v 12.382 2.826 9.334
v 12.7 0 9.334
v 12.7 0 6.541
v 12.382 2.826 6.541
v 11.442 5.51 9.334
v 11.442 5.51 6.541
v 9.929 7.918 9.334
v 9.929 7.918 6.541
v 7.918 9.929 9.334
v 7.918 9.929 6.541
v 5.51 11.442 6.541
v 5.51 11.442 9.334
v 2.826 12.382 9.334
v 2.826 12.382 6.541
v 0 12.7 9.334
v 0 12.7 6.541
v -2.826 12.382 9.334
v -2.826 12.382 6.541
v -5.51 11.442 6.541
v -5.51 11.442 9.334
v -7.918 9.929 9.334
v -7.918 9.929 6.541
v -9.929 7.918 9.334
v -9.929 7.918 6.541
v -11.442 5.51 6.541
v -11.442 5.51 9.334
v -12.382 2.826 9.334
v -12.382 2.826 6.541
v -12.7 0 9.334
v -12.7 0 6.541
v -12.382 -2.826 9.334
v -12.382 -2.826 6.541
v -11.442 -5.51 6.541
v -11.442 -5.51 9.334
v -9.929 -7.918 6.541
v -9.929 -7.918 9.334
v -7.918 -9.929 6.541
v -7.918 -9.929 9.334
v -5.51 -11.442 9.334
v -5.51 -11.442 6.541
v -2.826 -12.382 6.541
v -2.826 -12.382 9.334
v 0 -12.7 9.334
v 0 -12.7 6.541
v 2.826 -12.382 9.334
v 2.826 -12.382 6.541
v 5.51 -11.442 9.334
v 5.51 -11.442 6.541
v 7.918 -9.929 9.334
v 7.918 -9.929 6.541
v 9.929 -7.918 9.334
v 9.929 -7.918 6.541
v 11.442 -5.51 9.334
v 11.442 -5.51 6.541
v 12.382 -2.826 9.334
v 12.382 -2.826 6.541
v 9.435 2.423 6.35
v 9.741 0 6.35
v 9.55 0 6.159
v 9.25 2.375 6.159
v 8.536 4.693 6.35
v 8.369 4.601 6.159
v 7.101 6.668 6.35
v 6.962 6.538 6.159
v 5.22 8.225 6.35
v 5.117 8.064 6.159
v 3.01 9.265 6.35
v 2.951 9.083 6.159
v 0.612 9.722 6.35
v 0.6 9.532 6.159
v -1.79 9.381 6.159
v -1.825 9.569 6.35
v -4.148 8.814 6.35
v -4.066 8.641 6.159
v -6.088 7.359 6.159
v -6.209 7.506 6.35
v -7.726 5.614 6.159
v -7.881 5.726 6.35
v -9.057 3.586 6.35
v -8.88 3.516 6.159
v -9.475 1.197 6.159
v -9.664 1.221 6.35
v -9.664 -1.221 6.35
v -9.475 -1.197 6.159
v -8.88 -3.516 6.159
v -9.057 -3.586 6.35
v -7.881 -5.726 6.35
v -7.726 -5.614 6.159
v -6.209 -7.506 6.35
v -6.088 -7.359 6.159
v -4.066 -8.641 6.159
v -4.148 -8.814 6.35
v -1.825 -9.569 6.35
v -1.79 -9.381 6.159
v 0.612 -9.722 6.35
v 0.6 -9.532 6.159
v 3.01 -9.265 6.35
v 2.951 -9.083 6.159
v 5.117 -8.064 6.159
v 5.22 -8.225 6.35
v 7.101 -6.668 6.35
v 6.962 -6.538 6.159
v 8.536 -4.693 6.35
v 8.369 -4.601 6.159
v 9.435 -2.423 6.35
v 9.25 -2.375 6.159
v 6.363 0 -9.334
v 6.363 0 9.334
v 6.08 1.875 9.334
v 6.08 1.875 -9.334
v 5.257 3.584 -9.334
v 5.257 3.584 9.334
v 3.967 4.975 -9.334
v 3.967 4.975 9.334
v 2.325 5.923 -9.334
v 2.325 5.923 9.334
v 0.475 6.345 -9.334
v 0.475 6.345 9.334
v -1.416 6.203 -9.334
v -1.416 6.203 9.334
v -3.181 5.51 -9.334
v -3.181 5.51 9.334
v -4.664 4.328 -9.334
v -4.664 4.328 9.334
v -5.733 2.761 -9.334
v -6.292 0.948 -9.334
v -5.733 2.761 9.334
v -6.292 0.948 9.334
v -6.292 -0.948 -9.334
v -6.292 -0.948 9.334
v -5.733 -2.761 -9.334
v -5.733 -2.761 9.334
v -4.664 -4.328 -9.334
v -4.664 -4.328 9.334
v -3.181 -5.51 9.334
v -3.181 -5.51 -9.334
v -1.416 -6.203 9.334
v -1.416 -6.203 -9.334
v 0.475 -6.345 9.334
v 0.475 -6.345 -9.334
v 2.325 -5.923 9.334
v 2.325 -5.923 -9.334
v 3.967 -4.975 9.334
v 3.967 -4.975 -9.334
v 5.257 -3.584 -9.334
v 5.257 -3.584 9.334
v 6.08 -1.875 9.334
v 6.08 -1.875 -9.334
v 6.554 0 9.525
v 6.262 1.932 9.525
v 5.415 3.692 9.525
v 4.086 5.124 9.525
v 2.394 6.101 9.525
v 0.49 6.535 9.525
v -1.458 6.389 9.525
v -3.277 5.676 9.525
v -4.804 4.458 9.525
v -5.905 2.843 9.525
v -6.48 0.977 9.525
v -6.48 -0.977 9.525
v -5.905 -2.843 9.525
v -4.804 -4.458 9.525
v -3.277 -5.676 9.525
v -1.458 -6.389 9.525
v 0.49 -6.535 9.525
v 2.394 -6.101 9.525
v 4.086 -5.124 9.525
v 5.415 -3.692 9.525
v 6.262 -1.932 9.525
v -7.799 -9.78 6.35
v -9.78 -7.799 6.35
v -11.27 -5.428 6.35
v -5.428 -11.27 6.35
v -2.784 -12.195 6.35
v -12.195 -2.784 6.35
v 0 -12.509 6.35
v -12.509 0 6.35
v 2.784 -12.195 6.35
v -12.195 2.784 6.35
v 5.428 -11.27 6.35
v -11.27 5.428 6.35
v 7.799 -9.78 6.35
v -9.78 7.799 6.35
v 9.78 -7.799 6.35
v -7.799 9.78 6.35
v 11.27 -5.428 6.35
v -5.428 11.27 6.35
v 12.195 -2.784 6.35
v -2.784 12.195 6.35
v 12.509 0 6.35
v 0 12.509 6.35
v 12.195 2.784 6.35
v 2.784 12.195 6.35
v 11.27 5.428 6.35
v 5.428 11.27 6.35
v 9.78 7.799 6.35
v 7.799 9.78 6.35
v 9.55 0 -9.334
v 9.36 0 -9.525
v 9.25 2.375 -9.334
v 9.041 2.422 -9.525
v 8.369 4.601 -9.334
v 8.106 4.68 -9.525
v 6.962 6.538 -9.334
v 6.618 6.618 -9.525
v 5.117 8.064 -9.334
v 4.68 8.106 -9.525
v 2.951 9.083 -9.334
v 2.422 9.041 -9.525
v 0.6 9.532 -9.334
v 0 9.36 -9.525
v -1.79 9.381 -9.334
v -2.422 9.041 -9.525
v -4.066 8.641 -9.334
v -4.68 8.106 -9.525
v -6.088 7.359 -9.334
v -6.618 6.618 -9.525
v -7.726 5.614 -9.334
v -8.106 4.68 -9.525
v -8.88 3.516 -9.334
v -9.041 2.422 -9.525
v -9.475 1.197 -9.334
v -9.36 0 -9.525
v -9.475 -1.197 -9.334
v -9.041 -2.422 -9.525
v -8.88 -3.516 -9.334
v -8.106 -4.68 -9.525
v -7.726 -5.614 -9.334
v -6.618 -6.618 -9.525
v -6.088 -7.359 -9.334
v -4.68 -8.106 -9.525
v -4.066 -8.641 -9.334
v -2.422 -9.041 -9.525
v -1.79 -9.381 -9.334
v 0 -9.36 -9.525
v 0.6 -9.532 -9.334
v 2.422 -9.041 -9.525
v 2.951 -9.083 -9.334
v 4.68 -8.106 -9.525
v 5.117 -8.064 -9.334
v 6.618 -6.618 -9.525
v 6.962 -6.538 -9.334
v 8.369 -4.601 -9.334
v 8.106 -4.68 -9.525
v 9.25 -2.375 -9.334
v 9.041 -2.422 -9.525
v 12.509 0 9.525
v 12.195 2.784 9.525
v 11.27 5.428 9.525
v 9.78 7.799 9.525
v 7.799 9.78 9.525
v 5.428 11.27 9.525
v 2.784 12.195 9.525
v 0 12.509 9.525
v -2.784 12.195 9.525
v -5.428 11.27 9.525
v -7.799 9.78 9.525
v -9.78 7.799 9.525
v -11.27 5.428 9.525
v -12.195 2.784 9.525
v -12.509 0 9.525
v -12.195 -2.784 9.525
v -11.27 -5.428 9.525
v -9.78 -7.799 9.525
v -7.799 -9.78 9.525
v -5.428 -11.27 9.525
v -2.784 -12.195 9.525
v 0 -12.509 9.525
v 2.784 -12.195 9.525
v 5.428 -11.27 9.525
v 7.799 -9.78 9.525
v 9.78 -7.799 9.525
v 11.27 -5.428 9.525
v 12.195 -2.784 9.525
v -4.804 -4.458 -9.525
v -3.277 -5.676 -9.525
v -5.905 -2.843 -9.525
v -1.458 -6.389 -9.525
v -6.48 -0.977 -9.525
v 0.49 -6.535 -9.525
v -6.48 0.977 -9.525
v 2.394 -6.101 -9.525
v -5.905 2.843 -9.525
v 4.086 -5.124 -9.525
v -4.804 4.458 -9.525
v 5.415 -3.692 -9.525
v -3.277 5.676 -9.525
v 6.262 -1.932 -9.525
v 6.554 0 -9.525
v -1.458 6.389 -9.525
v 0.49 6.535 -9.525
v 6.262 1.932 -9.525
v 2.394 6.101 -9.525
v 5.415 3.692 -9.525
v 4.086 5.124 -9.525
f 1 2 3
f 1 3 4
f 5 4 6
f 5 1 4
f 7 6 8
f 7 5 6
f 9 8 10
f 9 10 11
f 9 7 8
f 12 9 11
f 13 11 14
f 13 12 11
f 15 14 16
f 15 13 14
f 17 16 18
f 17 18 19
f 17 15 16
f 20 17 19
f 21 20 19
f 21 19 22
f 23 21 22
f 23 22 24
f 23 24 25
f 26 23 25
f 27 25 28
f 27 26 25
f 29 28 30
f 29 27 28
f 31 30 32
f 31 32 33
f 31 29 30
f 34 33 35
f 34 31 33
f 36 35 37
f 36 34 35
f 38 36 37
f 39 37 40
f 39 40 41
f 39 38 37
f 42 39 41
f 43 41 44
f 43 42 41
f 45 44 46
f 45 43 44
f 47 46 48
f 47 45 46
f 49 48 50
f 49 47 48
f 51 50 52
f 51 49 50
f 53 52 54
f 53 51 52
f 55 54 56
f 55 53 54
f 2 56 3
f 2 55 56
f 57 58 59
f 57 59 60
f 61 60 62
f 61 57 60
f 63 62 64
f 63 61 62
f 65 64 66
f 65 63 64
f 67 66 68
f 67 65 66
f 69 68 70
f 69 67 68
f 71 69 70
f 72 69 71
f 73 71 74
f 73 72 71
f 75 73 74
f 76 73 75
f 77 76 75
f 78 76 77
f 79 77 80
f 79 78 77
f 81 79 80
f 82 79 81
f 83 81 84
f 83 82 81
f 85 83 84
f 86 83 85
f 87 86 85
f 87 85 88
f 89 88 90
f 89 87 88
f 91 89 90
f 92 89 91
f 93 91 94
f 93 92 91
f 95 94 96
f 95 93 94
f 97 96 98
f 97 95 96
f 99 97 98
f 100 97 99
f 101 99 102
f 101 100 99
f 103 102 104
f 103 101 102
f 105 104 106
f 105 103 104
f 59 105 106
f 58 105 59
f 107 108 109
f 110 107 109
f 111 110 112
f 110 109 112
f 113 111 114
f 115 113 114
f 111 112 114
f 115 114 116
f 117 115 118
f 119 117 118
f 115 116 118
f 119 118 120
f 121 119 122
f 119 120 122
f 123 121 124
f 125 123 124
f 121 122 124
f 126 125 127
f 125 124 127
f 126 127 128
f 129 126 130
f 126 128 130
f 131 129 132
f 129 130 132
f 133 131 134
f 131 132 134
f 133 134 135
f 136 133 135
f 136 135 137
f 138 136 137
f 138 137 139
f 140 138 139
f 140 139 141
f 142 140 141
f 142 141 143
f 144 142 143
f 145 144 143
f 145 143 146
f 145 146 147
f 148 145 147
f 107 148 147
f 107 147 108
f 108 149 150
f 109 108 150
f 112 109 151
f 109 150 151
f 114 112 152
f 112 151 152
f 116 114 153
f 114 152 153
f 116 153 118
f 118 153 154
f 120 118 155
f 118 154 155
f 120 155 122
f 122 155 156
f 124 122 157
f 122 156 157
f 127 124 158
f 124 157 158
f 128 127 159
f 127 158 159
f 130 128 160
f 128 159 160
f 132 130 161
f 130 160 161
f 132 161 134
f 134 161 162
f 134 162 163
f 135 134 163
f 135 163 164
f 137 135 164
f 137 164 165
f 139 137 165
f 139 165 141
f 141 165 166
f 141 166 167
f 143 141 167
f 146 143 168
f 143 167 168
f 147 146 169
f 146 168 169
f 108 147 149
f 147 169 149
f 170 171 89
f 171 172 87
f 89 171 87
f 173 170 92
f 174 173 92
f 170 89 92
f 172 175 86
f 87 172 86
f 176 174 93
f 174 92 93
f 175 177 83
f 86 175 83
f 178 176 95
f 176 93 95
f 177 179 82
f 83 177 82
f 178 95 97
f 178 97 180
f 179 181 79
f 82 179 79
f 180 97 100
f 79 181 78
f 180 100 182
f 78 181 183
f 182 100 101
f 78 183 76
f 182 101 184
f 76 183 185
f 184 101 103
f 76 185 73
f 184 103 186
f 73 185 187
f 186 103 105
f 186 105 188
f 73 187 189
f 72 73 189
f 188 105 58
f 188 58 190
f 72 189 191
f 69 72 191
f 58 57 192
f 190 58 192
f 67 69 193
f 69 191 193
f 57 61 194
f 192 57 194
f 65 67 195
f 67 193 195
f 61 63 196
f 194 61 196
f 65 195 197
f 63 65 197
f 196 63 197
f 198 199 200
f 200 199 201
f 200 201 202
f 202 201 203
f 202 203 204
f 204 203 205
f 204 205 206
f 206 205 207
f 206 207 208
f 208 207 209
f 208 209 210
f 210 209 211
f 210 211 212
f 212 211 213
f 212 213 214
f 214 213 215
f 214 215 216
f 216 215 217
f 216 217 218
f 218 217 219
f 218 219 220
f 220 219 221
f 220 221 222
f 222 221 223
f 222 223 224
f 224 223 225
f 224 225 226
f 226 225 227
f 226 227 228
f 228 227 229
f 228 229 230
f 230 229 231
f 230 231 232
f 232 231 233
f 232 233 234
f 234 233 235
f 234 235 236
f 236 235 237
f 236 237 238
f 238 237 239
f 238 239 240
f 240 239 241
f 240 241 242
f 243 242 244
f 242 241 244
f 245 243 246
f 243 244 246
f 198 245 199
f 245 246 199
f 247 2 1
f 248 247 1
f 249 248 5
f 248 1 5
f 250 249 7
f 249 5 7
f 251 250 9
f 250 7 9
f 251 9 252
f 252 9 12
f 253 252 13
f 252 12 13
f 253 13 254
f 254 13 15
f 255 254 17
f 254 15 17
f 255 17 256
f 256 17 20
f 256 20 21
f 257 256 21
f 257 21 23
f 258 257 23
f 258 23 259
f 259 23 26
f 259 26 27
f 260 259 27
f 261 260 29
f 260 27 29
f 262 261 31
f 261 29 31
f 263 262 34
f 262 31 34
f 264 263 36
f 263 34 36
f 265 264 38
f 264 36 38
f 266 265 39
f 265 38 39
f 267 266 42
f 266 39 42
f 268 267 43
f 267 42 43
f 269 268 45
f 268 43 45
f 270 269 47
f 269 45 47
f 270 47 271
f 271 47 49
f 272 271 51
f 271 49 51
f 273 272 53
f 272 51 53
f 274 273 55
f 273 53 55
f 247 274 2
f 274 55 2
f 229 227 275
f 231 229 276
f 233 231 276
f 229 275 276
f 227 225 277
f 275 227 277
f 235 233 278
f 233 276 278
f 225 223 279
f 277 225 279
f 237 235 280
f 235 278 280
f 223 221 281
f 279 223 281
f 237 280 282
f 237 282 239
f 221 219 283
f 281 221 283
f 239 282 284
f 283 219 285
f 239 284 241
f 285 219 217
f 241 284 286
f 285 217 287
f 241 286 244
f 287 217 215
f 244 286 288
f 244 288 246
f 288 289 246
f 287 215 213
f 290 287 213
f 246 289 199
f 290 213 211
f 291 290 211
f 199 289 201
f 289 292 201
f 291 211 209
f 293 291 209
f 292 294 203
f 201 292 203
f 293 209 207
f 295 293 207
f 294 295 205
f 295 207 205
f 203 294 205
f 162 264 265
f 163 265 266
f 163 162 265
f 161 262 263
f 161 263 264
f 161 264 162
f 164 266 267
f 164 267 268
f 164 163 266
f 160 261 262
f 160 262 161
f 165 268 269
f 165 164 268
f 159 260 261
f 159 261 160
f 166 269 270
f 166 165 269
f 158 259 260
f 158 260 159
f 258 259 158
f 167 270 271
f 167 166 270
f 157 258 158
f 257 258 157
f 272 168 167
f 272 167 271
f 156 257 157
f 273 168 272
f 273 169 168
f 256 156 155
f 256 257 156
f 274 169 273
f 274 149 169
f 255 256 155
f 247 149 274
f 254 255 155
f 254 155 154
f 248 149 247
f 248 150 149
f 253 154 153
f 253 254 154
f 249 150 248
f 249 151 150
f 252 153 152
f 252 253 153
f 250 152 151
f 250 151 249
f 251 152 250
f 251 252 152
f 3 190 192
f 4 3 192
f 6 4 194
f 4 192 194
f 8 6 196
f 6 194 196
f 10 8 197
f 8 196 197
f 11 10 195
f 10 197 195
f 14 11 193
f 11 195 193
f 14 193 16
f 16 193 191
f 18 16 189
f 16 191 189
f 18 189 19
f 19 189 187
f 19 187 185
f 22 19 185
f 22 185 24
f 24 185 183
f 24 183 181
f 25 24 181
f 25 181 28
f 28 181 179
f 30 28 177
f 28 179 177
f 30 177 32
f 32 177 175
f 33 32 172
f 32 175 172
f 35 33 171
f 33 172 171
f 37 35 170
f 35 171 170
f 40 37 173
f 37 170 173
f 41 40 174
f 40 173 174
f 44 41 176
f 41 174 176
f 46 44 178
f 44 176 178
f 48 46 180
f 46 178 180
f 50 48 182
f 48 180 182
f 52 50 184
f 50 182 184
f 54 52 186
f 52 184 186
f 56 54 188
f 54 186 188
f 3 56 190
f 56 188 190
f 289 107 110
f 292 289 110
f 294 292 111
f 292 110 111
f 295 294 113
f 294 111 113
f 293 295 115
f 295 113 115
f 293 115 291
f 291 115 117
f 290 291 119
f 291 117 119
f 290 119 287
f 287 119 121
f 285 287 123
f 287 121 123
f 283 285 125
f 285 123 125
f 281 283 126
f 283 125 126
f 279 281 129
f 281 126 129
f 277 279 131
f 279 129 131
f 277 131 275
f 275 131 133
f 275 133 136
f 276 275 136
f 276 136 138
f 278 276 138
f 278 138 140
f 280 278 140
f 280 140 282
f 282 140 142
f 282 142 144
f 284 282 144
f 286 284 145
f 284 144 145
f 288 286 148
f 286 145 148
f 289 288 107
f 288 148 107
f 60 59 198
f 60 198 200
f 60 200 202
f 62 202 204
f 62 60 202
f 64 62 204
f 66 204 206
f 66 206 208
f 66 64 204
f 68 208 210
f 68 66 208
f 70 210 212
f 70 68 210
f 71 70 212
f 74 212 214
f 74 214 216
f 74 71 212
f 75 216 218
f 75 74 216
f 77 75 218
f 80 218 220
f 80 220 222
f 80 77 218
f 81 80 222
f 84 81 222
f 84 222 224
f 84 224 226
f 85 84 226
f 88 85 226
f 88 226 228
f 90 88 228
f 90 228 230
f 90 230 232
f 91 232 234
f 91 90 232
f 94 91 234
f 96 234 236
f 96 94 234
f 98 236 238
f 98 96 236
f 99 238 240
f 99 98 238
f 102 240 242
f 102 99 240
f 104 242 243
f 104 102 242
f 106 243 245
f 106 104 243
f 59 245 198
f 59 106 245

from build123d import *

# Parameters (mm, degrees)
BOSS_EXTRUDE1_START = 9.525
SKETCH3_R           = 12.7
SKETCH3_R_2         = 6.3627
BOSS_EXTRUDE1_DEPTH = 3.175
BOSS_EXTRUDE2_START = 6.35
SKETCH4_R           = 9.5504
SKETCH4_R_2         = 6.3627
BOSS_EXTRUDE2_DEPTH = 15.875
CHAMFER1_SIZE       = 0.190881


with BuildPart() as part:
    # Sketch3 → Boss-Extrude1 (new body)
    with BuildSketch(Plane.XY.offset(BOSS_EXTRUDE1_START)):
        Circle(SKETCH3_R)
        Circle(SKETCH3_R_2, mode=Mode.SUBTRACT)
    extrude(amount=-BOSS_EXTRUDE1_DEPTH)

    # Sketch4 → Boss-Extrude2 (add)
    with BuildSketch(Plane.XY.offset(BOSS_EXTRUDE2_START)):
        Circle(SKETCH4_R)
        Circle(SKETCH4_R_2, mode=Mode.SUBTRACT)
    extrude(amount=-BOSS_EXTRUDE2_DEPTH)

    # Chamfer1
    chamfer1_edges = [part.edges().sort_by_distance(p)[0] for p in [
        (-6.3627, 0, -9.525),
        (-9.5504, 0, 6.35),
        (-12.7, 0, 9.525),
        (-12.7, 0, 6.35),
        (-6.3627, 0, 9.525),
        (-9.5504, 0, -9.525),
    ]]
    chamfer(chamfer1_edges, length=CHAMFER1_SIZE)


solid = part.part
